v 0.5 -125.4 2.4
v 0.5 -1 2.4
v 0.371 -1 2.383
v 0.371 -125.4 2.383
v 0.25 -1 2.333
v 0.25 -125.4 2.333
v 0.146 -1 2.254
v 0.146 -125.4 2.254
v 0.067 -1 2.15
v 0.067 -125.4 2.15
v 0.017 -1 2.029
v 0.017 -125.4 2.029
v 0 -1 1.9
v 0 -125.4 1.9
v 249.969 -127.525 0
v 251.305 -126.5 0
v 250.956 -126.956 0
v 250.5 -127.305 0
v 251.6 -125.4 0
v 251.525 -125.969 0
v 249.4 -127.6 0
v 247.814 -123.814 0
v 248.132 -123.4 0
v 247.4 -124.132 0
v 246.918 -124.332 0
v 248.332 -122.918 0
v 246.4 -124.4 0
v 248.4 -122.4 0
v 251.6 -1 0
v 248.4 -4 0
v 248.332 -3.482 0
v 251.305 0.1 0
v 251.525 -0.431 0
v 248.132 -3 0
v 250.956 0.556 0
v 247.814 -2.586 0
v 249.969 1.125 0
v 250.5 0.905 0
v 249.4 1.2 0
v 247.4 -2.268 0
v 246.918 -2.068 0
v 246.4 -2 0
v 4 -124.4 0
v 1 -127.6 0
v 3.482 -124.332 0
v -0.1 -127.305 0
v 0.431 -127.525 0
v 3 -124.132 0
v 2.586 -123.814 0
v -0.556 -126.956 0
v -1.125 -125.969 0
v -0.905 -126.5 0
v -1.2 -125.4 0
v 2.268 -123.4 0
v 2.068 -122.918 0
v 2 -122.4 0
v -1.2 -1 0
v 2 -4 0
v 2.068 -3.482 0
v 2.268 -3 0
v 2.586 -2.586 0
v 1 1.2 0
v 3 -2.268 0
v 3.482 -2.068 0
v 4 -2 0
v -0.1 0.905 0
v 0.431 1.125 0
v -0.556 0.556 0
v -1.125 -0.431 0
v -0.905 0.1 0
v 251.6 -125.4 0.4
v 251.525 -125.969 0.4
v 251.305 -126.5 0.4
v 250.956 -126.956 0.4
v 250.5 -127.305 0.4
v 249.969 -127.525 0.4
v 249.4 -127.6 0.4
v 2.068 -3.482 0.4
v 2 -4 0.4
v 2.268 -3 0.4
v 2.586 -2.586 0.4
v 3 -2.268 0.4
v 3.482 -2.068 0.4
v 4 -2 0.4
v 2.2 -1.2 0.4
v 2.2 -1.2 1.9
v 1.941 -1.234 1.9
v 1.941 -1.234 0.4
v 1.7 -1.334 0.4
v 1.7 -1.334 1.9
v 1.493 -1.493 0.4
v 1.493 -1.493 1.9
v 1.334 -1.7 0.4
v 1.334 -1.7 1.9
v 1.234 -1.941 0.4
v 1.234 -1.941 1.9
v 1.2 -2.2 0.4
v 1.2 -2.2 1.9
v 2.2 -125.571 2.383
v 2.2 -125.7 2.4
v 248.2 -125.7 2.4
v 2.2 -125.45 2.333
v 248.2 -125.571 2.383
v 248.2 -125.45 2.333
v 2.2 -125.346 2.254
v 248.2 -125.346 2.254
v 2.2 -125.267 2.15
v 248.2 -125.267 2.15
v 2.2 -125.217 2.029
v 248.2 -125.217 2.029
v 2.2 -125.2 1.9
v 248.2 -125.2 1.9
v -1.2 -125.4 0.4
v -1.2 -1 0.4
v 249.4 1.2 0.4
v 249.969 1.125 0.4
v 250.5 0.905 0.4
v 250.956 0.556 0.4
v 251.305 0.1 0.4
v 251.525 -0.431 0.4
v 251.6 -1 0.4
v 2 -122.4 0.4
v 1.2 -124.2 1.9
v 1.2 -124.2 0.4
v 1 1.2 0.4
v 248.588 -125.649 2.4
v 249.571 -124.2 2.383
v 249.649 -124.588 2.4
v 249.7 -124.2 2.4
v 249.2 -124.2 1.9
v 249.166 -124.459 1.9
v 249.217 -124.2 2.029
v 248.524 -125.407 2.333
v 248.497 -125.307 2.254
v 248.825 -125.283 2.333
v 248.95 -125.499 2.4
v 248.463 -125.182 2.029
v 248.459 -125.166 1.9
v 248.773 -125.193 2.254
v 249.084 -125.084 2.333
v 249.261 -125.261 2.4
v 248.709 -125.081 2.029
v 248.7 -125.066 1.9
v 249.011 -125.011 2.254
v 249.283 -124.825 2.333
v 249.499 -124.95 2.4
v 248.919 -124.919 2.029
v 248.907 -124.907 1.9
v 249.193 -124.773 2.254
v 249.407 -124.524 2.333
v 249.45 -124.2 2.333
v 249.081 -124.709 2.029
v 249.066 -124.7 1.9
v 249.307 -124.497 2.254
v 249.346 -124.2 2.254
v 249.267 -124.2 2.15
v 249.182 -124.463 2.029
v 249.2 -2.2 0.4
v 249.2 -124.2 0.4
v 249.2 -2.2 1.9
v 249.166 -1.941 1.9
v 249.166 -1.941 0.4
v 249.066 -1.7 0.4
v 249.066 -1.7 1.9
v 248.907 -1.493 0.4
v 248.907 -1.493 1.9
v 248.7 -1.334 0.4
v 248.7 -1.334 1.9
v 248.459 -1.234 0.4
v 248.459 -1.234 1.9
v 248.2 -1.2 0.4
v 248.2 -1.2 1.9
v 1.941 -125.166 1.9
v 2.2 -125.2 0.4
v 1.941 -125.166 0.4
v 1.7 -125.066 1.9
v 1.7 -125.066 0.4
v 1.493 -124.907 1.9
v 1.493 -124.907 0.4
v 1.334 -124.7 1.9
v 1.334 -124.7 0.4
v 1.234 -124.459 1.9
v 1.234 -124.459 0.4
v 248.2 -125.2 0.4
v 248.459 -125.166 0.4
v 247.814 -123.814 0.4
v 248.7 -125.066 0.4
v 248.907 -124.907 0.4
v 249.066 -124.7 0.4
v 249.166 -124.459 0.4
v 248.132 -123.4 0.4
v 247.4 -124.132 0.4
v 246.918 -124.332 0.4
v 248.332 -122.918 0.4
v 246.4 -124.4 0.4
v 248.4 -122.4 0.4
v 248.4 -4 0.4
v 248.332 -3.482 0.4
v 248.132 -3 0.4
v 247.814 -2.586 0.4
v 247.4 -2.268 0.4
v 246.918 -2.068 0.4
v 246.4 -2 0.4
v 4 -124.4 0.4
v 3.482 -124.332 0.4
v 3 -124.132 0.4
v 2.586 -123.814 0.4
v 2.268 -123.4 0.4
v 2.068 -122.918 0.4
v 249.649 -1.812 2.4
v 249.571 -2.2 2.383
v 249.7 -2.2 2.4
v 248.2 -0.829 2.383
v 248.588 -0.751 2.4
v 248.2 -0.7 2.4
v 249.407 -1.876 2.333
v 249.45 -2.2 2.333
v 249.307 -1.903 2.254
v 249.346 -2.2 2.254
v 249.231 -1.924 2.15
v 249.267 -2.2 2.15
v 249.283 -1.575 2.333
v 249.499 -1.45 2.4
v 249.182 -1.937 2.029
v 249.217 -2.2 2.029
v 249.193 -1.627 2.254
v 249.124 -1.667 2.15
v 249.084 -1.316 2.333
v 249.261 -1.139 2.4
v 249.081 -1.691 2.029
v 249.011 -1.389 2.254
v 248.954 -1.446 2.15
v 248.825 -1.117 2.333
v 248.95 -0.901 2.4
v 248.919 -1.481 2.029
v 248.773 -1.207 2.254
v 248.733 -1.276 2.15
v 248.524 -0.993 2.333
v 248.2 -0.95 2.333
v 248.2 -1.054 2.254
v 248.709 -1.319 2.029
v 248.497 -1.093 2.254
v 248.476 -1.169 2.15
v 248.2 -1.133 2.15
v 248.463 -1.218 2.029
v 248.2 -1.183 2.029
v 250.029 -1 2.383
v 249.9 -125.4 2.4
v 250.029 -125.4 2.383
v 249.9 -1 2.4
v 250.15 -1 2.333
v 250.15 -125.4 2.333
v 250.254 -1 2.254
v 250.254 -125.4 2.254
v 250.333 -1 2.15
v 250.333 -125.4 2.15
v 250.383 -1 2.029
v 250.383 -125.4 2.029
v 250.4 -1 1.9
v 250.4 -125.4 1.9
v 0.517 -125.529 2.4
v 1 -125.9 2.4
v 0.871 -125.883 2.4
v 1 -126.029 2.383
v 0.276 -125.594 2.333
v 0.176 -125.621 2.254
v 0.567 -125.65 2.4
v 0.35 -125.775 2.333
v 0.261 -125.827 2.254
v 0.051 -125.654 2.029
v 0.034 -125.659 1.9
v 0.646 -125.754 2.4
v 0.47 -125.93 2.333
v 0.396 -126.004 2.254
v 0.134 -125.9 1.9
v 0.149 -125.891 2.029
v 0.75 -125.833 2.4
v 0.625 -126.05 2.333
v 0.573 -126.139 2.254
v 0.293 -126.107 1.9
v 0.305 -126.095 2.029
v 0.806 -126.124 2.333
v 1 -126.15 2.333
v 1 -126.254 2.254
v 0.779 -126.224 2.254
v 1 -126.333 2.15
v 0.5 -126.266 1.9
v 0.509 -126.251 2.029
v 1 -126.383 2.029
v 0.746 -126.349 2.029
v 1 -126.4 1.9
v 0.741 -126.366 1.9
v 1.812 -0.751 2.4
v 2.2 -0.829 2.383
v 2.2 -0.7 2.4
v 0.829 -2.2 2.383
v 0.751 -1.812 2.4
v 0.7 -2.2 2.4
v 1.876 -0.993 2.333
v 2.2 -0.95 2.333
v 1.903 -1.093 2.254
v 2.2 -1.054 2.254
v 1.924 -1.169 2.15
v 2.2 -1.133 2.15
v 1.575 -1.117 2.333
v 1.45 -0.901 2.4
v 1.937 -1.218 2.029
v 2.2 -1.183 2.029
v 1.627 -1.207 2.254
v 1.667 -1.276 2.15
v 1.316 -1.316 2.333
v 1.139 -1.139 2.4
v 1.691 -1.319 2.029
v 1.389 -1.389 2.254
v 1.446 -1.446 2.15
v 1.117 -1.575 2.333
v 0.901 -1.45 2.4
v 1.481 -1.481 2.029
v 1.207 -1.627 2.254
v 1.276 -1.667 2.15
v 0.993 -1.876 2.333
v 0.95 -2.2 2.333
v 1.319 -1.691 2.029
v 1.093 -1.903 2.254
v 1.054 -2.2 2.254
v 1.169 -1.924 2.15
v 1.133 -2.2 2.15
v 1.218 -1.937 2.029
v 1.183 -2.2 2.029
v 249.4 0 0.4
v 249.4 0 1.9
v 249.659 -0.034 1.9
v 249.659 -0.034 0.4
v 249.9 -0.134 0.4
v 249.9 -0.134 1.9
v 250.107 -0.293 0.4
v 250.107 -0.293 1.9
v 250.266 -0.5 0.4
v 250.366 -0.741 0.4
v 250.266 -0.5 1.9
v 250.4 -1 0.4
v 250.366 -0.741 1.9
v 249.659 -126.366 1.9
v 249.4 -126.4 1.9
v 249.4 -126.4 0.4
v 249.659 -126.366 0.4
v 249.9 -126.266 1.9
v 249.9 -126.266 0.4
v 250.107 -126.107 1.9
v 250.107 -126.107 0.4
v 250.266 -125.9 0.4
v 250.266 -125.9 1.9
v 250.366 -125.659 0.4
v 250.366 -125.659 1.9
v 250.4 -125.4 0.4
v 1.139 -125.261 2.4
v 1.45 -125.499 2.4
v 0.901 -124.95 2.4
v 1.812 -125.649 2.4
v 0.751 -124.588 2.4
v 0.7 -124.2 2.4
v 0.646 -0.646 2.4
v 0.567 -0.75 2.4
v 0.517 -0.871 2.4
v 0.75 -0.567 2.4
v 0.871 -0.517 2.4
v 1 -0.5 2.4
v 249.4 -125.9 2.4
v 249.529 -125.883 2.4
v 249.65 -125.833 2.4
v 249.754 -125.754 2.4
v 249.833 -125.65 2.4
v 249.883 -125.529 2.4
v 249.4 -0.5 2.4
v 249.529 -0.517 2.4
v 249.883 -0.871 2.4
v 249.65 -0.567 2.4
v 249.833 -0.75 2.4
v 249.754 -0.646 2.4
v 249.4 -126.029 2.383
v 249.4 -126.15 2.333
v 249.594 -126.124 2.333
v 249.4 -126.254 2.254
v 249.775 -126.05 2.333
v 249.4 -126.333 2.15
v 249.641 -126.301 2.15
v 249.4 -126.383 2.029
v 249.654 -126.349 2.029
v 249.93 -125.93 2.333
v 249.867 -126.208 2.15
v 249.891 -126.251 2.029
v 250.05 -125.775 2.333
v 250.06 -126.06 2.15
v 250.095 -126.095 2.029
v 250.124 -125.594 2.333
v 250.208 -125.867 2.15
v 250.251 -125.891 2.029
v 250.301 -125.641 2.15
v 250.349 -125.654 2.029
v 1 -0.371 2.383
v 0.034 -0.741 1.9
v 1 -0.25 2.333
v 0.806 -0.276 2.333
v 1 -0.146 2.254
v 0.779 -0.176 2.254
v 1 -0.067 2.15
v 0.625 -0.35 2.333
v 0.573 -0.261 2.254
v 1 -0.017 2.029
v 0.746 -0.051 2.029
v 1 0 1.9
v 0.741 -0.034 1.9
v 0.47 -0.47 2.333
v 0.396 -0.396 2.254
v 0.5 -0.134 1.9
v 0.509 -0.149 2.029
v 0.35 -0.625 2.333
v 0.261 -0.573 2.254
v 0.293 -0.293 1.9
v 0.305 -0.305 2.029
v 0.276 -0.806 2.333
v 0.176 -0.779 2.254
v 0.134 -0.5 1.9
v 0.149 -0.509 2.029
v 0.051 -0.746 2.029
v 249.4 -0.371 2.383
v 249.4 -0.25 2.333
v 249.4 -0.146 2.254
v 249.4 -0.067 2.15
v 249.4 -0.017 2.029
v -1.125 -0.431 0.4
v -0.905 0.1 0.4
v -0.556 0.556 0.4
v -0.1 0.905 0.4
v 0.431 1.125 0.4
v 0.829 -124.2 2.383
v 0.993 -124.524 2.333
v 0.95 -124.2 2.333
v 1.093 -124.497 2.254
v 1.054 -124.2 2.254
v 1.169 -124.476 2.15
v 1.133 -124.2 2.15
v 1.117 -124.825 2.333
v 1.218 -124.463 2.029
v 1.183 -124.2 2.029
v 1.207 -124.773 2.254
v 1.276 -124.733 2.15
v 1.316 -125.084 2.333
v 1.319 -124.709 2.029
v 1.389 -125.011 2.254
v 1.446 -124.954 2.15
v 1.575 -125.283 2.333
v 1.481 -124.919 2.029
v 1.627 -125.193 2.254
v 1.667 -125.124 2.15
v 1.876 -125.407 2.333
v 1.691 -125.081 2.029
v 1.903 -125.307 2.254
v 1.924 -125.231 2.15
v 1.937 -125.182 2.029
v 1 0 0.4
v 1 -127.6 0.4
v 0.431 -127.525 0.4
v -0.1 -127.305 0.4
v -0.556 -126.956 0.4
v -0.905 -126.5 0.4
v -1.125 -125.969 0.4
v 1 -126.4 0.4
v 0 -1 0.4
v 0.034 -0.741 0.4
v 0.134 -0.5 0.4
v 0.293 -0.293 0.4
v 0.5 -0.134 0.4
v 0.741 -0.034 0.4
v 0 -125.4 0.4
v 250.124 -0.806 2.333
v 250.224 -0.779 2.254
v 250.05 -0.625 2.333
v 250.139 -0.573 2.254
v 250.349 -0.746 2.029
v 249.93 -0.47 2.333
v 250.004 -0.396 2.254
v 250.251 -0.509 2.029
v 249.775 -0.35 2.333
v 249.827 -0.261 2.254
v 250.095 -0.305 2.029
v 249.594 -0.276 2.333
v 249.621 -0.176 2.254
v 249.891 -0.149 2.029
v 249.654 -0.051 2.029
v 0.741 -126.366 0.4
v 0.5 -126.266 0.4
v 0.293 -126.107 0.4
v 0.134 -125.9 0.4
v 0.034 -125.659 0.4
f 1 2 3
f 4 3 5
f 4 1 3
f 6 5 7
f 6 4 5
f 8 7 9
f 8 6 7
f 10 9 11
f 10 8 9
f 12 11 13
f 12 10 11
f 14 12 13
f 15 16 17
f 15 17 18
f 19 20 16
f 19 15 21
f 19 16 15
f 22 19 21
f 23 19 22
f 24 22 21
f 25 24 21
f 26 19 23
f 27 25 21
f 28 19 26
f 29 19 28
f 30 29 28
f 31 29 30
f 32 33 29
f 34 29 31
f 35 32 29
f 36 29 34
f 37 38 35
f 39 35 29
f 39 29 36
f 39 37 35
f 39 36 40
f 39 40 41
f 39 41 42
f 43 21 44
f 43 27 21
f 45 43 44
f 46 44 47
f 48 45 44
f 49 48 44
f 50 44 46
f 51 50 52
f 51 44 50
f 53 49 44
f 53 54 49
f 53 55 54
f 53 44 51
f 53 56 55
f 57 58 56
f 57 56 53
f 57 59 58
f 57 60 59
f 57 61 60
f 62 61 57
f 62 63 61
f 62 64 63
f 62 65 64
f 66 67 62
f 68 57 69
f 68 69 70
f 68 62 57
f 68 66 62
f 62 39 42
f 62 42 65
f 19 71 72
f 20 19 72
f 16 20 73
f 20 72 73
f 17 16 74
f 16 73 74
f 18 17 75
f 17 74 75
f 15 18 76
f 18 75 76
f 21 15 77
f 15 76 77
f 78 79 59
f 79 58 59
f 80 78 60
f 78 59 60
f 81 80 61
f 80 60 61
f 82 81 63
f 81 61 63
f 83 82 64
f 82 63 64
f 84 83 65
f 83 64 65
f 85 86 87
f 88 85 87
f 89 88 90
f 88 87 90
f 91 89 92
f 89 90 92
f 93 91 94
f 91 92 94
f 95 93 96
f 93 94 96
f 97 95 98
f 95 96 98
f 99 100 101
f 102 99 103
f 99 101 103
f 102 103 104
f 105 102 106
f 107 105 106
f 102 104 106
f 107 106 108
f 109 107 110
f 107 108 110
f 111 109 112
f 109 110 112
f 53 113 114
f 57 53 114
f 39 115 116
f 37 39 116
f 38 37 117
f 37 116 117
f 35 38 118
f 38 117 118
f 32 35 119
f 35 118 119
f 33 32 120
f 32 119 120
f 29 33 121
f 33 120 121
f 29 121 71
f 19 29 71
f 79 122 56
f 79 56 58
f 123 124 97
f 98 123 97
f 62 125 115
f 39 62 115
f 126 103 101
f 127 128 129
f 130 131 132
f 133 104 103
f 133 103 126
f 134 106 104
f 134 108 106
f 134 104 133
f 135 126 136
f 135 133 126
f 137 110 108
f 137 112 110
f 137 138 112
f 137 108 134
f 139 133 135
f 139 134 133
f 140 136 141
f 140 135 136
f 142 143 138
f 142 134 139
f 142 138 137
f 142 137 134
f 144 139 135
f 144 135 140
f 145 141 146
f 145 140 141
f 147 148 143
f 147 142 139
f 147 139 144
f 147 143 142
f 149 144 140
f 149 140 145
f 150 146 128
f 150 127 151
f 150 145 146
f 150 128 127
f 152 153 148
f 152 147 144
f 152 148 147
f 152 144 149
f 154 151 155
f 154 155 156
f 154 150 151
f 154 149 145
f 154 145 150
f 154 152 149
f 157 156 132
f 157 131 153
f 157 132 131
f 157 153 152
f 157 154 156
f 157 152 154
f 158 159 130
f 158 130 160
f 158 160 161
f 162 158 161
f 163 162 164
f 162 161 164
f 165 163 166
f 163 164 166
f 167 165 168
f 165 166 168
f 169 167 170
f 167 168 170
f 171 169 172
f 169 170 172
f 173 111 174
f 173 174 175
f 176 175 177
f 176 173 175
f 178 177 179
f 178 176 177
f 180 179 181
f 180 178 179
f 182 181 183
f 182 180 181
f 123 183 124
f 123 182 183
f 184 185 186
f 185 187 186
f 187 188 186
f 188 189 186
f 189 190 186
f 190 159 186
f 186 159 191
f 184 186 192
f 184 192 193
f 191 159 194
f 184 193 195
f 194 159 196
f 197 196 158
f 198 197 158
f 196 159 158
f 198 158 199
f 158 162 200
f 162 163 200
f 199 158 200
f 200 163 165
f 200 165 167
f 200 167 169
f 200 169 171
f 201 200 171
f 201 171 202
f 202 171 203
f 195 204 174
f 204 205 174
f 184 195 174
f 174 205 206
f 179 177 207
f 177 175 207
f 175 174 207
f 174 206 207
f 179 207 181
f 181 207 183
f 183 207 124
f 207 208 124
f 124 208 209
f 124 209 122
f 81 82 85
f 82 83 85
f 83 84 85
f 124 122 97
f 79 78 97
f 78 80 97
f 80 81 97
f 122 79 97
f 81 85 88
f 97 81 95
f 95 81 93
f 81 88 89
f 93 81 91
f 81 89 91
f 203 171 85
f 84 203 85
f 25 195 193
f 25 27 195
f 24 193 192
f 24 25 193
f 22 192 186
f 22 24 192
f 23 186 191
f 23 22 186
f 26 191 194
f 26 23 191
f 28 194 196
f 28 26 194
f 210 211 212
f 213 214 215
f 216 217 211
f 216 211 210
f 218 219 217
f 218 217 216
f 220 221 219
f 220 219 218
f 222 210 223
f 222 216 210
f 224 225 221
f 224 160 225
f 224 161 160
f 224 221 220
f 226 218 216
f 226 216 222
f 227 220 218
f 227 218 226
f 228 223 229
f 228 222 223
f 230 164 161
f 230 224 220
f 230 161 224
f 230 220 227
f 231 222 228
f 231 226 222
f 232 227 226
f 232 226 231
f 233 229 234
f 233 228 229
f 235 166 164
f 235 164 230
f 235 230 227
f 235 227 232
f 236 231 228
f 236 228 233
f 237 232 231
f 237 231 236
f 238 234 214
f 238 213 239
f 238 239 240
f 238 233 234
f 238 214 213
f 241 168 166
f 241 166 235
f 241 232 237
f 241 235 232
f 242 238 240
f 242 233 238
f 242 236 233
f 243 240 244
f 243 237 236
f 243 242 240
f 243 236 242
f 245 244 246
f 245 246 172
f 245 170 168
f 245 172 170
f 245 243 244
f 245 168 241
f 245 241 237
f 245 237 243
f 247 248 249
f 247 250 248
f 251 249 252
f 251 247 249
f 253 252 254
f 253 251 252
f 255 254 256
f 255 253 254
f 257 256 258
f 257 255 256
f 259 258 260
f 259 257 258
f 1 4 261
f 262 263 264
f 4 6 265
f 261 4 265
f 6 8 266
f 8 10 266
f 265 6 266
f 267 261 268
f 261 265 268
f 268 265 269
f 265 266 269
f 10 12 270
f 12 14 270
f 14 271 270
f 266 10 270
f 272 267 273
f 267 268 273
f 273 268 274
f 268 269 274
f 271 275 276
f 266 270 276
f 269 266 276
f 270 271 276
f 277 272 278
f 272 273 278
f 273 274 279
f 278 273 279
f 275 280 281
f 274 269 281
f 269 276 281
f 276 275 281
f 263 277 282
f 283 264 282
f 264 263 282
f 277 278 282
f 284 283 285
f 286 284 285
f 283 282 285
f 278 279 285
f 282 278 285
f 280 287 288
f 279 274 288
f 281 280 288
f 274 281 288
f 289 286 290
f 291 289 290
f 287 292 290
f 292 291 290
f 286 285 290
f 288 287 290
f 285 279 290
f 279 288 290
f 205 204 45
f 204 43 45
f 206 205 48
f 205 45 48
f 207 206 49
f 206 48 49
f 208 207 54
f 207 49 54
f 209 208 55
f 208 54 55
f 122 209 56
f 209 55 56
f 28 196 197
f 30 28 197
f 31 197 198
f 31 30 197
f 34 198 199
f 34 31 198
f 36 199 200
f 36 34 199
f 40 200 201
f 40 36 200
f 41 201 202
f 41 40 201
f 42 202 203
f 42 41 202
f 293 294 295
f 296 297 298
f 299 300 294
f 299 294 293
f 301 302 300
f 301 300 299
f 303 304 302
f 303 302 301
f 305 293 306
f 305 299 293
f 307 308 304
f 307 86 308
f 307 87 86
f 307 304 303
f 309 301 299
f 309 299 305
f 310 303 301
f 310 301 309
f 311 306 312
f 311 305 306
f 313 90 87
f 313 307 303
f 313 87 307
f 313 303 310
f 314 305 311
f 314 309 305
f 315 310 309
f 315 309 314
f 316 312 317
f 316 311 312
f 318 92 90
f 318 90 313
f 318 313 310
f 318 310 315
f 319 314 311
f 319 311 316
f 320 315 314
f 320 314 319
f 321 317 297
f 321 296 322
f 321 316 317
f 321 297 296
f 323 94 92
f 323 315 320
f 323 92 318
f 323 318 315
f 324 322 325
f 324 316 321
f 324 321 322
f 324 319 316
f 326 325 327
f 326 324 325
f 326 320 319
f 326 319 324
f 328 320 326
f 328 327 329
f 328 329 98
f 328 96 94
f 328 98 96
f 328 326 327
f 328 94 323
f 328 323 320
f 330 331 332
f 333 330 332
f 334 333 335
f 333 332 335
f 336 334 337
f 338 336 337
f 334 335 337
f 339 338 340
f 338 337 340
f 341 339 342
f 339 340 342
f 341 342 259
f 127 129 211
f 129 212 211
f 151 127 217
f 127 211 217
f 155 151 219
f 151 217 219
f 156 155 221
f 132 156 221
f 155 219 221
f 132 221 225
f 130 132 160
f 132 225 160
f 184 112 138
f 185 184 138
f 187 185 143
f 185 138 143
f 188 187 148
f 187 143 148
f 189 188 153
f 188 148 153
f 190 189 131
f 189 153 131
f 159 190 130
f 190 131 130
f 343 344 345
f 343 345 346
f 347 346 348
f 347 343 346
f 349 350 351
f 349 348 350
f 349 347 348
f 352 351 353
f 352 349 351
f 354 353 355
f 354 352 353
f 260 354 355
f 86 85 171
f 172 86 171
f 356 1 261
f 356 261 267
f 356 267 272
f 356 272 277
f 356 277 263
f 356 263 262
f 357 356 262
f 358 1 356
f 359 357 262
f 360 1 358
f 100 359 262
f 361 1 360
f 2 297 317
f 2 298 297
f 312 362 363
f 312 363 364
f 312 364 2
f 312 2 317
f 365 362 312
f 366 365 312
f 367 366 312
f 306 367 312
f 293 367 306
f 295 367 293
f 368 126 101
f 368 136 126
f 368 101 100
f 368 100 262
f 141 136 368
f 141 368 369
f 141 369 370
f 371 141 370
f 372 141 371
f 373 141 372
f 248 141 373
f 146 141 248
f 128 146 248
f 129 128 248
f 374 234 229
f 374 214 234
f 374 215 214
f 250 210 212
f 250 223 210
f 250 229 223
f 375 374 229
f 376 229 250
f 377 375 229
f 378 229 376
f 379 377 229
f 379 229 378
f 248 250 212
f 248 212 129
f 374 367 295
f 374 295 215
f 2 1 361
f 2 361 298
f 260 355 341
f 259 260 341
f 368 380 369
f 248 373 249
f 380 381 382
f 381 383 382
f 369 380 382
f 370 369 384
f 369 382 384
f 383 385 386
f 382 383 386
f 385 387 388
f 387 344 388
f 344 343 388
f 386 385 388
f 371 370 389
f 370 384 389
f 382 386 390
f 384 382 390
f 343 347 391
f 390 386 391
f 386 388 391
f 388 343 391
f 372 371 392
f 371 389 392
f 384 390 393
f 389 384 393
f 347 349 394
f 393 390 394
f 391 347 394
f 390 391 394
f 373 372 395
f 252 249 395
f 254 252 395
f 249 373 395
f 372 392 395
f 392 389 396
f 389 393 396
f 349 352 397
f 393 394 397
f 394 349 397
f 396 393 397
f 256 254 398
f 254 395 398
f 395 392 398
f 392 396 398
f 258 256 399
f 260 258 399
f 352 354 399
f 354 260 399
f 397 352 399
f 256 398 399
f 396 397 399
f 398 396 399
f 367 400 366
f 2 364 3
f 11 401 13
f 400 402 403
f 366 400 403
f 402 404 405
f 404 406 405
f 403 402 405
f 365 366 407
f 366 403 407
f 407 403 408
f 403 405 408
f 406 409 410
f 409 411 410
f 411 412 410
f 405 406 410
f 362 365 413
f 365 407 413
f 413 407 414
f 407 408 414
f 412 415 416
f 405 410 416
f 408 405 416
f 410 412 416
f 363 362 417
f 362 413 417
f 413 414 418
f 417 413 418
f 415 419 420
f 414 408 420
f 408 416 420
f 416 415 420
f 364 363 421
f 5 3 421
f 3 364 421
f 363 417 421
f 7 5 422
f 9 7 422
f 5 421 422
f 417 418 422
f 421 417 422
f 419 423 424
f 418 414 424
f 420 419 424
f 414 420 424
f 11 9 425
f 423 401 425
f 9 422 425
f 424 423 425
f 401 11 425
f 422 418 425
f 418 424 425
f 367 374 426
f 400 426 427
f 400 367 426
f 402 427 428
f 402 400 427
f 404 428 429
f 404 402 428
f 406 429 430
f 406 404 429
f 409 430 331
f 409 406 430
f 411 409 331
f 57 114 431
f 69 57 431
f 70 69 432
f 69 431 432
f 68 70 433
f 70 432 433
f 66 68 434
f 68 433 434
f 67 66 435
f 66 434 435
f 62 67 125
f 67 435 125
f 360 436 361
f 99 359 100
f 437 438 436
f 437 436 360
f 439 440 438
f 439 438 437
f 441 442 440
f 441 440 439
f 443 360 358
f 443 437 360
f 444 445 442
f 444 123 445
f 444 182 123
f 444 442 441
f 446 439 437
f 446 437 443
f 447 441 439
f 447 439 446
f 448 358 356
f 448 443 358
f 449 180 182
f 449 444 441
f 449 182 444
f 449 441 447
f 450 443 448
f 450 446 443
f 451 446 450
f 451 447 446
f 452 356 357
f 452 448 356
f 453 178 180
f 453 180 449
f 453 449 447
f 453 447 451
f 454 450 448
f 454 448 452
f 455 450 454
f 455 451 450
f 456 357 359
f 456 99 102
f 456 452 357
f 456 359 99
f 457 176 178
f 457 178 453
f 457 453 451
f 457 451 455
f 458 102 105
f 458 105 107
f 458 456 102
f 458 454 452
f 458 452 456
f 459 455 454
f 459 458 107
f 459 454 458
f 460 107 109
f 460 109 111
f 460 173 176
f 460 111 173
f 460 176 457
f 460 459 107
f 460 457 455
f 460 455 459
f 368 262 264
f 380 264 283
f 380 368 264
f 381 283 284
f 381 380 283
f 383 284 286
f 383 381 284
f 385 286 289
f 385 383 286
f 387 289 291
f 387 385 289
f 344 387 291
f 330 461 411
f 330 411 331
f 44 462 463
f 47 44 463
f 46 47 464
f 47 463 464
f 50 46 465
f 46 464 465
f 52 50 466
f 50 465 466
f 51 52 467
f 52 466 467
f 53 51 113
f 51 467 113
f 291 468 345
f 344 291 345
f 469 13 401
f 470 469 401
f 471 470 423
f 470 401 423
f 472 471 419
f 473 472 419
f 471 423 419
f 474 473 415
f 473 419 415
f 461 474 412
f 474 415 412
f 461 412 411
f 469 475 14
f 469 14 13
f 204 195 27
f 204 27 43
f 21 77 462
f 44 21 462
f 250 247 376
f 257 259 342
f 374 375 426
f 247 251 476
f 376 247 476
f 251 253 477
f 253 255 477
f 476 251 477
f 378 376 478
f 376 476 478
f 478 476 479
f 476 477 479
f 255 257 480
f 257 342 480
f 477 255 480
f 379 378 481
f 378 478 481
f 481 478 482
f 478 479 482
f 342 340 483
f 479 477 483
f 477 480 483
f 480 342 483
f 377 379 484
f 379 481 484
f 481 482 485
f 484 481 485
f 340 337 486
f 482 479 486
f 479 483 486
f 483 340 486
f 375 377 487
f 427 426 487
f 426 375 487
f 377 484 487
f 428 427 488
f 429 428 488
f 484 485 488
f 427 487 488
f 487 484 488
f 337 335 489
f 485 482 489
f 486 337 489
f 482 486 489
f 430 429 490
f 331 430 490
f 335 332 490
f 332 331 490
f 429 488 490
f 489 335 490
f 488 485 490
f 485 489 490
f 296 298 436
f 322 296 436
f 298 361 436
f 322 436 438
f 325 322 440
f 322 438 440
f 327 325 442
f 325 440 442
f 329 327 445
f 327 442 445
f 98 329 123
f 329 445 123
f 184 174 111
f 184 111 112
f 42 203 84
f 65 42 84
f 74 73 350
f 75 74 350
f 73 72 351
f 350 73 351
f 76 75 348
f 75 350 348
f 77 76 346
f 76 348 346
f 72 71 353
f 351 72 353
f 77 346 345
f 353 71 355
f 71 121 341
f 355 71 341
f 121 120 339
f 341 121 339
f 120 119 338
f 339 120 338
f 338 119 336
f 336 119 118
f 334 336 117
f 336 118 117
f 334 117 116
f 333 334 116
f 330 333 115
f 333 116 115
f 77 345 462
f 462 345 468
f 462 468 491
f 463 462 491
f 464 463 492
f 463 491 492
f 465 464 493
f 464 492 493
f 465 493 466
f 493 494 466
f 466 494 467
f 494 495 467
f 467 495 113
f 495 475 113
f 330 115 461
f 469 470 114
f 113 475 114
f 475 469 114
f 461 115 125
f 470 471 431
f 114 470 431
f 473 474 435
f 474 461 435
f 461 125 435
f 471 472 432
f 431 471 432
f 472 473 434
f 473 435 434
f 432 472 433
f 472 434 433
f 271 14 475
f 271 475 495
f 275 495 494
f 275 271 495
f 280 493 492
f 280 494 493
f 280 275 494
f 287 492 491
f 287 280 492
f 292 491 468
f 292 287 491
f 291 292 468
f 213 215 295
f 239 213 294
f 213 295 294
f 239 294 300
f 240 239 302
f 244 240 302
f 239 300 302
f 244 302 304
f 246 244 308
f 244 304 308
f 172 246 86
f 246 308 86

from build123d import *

# Parameters (mm, degrees)
SKIZZE1_W                       = 250.4
SKIZZE1_H                       = 126.4
SKIZZE1_W_2                     = 248
SKIZZE1_H_2                     = 124
AUFSATZ_LINEAR_AUSTRAGEN1_DEPTH = 2.4
VERRUNDUNG1_R                   = 1
VERRUNDUNG2_R                   = 0.5
AUFSATZ_LINEAR_START            = -0.4
AUFSATZ_LINEAR_AUSTRAGEN2_DEPTH = 0.4
SKIZZE3_W                       = 246.4
SKIZZE3_H                       = 122.4
AUFSATZ_LINEAR_AUSTRAGEN3_DEPTH = 0.4
VERRUNDUNG3_R                   = 2


with BuildPart() as part:
    # Skizze1 → Aufsatz-Linear austragen1 (new body)
    with BuildSketch(Plane.XY):
        with Locations((125.2, -63.2)):
            Rectangle(SKIZZE1_W, SKIZZE1_H)
        with Locations((125.2, -63.2)):
            Rectangle(SKIZZE1_W_2, SKIZZE1_H_2, mode=Mode.SUBTRACT)
    extrude(amount=AUFSATZ_LINEAR_AUSTRAGEN1_DEPTH)

    # Verrundung1
    verrundung1_edges = [part.edges().sort_by_distance(p)[0] for p in [
        (1.2, -1.2, 1.2),
        (1.2, -125.2, 1.2),
        (249.2, -125.2, 1.2),
        (249.2, -1.2, 1.2),
        (0, 0, 1.2),
        (250.4, 0, 1.2),
        (250.4, -126.4, 1.2),
        (0, -126.4, 1.2),
    ]]
    fillet(verrundung1_edges, radius=VERRUNDUNG1_R)

    # Verrundung2
    verrundung2_edges = [part.edges().sort_by_distance(p)[0] for p in [
        (249.2, -63.2, 2.4),
        (125.2, -1.2, 2.4),
        (125.2, -125.2, 2.4),
        (250.4, -63.2, 2.4),
        (125.2, -126.4, 2.4),
        (0, -63.2, 2.4),
        (125.2, 0, 2.4),
        (1.2, -63.2, 2.4),
        (0.292893219, -0.292893219, 2.4),
        (0.292893219, -126.107106781, 2.4),
        (250.107106781, -0.292893219, 2.4),
        (250.107106781, -126.107106781, 2.4),
        (248.907106781, -1.492893219, 2.4),
        (248.907106781, -124.907106781, 2.4),
        (1.492893219, -124.907106781, 2.4),
        (1.492893219, -1.492893219, 2.4),
    ]]
    fillet(verrundung2_edges, radius=VERRUNDUNG2_R)

    # Skizze2 → Aufsatz-Linear austragen2 (add)
    with BuildSketch(Plane(origin=(0, 0, 0), x_dir=(-1, 0, 0), z_dir=(0, 0, -1)).offset(AUFSATZ_LINEAR_START)):
        with BuildLine():
            Line((-1, 1.2), (-249.4, 1.2))
            ThreePointArc((-249.4, 1.2), (-250.955634919, 0.555634919), (-251.6, -1))
            Line((-251.6, -1), (-251.6, -125.4))
            ThreePointArc((-251.6, -125.4), (-250.955634919, -126.955634919), (-249.4, -127.6))
            Line((-249.4, -127.6), (-1, -127.6))
            ThreePointArc((-1, -127.6), (0.555634919, -126.955634919), (1.2, -125.4))
            Line((1.2, -125.4), (1.2, -1))
            ThreePointArc((1.2, -1), (0.555634919, 0.555634919), (-1, 1.2))
        make_face()
        with BuildLine():
            Line((-250.4, -1), (-250.4, -125.4))
            ThreePointArc((-250.4, -125.4), (-250.107106781, -126.107106781), (-249.4, -126.4))
            Line((-249.4, -126.4), (-1, -126.4))
            ThreePointArc((-1, -126.4), (-0.292893219, -126.107106781), (0, -125.4))
            Line((0, -125.4), (0, -1))
            ThreePointArc((0, -1), (-0.292893219, -0.292893219), (-1, 0))
            Line((-1, 0), (-249.4, 0))
            ThreePointArc((-249.4, 0), (-250.107106781, -0.292893219), (-250.4, -1))
        make_face(mode=Mode.SUBTRACT)
    extrude(amount=AUFSATZ_LINEAR_AUSTRAGEN2_DEPTH)

    # Skizze3 → Aufsatz-Linear austragen3 (add)
    with BuildSketch(Plane(origin=(0, 0, 0), x_dir=(-1, 0, 0), z_dir=(0, 0, -1)).offset(AUFSATZ_LINEAR_START)):
        with BuildLine():
            Line((-1, 1.2), (-249.4, 1.2))
            ThreePointArc((-249.4, 1.2), (-250.955634919, 0.555634919), (-251.6, -1))
            Line((-251.6, -1), (-251.6, -125.4))
            ThreePointArc((-251.6, -125.4), (-250.955634919, -126.955634919), (-249.4, -127.6))
            Line((-249.4, -127.6), (-1, -127.6))
            ThreePointArc((-1, -127.6), (0.555634919, -126.955634919), (1.2, -125.4))
            Line((1.2, -125.4), (1.2, -1))
            ThreePointArc((1.2, -1), (0.555634919, 0.555634919), (-1, 1.2))
        make_face()
        with Locations((-125.2, -63.2)):
            Rectangle(SKIZZE3_W, SKIZZE3_H, mode=Mode.SUBTRACT)
    extrude(amount=AUFSATZ_LINEAR_AUSTRAGEN3_DEPTH)

    # Verrundung3
    verrundung3_edges = [part.edges().sort_by_distance(p)[0] for p in [
        (2, -124.4, 0.2),
        (248.4, -124.4, 0.2),
        (248.4, -2, 0.2),
        (2, -2, 0.2),
    ]]
    fillet(verrundung3_edges, radius=VERRUNDUNG3_R)


solid = part.part
